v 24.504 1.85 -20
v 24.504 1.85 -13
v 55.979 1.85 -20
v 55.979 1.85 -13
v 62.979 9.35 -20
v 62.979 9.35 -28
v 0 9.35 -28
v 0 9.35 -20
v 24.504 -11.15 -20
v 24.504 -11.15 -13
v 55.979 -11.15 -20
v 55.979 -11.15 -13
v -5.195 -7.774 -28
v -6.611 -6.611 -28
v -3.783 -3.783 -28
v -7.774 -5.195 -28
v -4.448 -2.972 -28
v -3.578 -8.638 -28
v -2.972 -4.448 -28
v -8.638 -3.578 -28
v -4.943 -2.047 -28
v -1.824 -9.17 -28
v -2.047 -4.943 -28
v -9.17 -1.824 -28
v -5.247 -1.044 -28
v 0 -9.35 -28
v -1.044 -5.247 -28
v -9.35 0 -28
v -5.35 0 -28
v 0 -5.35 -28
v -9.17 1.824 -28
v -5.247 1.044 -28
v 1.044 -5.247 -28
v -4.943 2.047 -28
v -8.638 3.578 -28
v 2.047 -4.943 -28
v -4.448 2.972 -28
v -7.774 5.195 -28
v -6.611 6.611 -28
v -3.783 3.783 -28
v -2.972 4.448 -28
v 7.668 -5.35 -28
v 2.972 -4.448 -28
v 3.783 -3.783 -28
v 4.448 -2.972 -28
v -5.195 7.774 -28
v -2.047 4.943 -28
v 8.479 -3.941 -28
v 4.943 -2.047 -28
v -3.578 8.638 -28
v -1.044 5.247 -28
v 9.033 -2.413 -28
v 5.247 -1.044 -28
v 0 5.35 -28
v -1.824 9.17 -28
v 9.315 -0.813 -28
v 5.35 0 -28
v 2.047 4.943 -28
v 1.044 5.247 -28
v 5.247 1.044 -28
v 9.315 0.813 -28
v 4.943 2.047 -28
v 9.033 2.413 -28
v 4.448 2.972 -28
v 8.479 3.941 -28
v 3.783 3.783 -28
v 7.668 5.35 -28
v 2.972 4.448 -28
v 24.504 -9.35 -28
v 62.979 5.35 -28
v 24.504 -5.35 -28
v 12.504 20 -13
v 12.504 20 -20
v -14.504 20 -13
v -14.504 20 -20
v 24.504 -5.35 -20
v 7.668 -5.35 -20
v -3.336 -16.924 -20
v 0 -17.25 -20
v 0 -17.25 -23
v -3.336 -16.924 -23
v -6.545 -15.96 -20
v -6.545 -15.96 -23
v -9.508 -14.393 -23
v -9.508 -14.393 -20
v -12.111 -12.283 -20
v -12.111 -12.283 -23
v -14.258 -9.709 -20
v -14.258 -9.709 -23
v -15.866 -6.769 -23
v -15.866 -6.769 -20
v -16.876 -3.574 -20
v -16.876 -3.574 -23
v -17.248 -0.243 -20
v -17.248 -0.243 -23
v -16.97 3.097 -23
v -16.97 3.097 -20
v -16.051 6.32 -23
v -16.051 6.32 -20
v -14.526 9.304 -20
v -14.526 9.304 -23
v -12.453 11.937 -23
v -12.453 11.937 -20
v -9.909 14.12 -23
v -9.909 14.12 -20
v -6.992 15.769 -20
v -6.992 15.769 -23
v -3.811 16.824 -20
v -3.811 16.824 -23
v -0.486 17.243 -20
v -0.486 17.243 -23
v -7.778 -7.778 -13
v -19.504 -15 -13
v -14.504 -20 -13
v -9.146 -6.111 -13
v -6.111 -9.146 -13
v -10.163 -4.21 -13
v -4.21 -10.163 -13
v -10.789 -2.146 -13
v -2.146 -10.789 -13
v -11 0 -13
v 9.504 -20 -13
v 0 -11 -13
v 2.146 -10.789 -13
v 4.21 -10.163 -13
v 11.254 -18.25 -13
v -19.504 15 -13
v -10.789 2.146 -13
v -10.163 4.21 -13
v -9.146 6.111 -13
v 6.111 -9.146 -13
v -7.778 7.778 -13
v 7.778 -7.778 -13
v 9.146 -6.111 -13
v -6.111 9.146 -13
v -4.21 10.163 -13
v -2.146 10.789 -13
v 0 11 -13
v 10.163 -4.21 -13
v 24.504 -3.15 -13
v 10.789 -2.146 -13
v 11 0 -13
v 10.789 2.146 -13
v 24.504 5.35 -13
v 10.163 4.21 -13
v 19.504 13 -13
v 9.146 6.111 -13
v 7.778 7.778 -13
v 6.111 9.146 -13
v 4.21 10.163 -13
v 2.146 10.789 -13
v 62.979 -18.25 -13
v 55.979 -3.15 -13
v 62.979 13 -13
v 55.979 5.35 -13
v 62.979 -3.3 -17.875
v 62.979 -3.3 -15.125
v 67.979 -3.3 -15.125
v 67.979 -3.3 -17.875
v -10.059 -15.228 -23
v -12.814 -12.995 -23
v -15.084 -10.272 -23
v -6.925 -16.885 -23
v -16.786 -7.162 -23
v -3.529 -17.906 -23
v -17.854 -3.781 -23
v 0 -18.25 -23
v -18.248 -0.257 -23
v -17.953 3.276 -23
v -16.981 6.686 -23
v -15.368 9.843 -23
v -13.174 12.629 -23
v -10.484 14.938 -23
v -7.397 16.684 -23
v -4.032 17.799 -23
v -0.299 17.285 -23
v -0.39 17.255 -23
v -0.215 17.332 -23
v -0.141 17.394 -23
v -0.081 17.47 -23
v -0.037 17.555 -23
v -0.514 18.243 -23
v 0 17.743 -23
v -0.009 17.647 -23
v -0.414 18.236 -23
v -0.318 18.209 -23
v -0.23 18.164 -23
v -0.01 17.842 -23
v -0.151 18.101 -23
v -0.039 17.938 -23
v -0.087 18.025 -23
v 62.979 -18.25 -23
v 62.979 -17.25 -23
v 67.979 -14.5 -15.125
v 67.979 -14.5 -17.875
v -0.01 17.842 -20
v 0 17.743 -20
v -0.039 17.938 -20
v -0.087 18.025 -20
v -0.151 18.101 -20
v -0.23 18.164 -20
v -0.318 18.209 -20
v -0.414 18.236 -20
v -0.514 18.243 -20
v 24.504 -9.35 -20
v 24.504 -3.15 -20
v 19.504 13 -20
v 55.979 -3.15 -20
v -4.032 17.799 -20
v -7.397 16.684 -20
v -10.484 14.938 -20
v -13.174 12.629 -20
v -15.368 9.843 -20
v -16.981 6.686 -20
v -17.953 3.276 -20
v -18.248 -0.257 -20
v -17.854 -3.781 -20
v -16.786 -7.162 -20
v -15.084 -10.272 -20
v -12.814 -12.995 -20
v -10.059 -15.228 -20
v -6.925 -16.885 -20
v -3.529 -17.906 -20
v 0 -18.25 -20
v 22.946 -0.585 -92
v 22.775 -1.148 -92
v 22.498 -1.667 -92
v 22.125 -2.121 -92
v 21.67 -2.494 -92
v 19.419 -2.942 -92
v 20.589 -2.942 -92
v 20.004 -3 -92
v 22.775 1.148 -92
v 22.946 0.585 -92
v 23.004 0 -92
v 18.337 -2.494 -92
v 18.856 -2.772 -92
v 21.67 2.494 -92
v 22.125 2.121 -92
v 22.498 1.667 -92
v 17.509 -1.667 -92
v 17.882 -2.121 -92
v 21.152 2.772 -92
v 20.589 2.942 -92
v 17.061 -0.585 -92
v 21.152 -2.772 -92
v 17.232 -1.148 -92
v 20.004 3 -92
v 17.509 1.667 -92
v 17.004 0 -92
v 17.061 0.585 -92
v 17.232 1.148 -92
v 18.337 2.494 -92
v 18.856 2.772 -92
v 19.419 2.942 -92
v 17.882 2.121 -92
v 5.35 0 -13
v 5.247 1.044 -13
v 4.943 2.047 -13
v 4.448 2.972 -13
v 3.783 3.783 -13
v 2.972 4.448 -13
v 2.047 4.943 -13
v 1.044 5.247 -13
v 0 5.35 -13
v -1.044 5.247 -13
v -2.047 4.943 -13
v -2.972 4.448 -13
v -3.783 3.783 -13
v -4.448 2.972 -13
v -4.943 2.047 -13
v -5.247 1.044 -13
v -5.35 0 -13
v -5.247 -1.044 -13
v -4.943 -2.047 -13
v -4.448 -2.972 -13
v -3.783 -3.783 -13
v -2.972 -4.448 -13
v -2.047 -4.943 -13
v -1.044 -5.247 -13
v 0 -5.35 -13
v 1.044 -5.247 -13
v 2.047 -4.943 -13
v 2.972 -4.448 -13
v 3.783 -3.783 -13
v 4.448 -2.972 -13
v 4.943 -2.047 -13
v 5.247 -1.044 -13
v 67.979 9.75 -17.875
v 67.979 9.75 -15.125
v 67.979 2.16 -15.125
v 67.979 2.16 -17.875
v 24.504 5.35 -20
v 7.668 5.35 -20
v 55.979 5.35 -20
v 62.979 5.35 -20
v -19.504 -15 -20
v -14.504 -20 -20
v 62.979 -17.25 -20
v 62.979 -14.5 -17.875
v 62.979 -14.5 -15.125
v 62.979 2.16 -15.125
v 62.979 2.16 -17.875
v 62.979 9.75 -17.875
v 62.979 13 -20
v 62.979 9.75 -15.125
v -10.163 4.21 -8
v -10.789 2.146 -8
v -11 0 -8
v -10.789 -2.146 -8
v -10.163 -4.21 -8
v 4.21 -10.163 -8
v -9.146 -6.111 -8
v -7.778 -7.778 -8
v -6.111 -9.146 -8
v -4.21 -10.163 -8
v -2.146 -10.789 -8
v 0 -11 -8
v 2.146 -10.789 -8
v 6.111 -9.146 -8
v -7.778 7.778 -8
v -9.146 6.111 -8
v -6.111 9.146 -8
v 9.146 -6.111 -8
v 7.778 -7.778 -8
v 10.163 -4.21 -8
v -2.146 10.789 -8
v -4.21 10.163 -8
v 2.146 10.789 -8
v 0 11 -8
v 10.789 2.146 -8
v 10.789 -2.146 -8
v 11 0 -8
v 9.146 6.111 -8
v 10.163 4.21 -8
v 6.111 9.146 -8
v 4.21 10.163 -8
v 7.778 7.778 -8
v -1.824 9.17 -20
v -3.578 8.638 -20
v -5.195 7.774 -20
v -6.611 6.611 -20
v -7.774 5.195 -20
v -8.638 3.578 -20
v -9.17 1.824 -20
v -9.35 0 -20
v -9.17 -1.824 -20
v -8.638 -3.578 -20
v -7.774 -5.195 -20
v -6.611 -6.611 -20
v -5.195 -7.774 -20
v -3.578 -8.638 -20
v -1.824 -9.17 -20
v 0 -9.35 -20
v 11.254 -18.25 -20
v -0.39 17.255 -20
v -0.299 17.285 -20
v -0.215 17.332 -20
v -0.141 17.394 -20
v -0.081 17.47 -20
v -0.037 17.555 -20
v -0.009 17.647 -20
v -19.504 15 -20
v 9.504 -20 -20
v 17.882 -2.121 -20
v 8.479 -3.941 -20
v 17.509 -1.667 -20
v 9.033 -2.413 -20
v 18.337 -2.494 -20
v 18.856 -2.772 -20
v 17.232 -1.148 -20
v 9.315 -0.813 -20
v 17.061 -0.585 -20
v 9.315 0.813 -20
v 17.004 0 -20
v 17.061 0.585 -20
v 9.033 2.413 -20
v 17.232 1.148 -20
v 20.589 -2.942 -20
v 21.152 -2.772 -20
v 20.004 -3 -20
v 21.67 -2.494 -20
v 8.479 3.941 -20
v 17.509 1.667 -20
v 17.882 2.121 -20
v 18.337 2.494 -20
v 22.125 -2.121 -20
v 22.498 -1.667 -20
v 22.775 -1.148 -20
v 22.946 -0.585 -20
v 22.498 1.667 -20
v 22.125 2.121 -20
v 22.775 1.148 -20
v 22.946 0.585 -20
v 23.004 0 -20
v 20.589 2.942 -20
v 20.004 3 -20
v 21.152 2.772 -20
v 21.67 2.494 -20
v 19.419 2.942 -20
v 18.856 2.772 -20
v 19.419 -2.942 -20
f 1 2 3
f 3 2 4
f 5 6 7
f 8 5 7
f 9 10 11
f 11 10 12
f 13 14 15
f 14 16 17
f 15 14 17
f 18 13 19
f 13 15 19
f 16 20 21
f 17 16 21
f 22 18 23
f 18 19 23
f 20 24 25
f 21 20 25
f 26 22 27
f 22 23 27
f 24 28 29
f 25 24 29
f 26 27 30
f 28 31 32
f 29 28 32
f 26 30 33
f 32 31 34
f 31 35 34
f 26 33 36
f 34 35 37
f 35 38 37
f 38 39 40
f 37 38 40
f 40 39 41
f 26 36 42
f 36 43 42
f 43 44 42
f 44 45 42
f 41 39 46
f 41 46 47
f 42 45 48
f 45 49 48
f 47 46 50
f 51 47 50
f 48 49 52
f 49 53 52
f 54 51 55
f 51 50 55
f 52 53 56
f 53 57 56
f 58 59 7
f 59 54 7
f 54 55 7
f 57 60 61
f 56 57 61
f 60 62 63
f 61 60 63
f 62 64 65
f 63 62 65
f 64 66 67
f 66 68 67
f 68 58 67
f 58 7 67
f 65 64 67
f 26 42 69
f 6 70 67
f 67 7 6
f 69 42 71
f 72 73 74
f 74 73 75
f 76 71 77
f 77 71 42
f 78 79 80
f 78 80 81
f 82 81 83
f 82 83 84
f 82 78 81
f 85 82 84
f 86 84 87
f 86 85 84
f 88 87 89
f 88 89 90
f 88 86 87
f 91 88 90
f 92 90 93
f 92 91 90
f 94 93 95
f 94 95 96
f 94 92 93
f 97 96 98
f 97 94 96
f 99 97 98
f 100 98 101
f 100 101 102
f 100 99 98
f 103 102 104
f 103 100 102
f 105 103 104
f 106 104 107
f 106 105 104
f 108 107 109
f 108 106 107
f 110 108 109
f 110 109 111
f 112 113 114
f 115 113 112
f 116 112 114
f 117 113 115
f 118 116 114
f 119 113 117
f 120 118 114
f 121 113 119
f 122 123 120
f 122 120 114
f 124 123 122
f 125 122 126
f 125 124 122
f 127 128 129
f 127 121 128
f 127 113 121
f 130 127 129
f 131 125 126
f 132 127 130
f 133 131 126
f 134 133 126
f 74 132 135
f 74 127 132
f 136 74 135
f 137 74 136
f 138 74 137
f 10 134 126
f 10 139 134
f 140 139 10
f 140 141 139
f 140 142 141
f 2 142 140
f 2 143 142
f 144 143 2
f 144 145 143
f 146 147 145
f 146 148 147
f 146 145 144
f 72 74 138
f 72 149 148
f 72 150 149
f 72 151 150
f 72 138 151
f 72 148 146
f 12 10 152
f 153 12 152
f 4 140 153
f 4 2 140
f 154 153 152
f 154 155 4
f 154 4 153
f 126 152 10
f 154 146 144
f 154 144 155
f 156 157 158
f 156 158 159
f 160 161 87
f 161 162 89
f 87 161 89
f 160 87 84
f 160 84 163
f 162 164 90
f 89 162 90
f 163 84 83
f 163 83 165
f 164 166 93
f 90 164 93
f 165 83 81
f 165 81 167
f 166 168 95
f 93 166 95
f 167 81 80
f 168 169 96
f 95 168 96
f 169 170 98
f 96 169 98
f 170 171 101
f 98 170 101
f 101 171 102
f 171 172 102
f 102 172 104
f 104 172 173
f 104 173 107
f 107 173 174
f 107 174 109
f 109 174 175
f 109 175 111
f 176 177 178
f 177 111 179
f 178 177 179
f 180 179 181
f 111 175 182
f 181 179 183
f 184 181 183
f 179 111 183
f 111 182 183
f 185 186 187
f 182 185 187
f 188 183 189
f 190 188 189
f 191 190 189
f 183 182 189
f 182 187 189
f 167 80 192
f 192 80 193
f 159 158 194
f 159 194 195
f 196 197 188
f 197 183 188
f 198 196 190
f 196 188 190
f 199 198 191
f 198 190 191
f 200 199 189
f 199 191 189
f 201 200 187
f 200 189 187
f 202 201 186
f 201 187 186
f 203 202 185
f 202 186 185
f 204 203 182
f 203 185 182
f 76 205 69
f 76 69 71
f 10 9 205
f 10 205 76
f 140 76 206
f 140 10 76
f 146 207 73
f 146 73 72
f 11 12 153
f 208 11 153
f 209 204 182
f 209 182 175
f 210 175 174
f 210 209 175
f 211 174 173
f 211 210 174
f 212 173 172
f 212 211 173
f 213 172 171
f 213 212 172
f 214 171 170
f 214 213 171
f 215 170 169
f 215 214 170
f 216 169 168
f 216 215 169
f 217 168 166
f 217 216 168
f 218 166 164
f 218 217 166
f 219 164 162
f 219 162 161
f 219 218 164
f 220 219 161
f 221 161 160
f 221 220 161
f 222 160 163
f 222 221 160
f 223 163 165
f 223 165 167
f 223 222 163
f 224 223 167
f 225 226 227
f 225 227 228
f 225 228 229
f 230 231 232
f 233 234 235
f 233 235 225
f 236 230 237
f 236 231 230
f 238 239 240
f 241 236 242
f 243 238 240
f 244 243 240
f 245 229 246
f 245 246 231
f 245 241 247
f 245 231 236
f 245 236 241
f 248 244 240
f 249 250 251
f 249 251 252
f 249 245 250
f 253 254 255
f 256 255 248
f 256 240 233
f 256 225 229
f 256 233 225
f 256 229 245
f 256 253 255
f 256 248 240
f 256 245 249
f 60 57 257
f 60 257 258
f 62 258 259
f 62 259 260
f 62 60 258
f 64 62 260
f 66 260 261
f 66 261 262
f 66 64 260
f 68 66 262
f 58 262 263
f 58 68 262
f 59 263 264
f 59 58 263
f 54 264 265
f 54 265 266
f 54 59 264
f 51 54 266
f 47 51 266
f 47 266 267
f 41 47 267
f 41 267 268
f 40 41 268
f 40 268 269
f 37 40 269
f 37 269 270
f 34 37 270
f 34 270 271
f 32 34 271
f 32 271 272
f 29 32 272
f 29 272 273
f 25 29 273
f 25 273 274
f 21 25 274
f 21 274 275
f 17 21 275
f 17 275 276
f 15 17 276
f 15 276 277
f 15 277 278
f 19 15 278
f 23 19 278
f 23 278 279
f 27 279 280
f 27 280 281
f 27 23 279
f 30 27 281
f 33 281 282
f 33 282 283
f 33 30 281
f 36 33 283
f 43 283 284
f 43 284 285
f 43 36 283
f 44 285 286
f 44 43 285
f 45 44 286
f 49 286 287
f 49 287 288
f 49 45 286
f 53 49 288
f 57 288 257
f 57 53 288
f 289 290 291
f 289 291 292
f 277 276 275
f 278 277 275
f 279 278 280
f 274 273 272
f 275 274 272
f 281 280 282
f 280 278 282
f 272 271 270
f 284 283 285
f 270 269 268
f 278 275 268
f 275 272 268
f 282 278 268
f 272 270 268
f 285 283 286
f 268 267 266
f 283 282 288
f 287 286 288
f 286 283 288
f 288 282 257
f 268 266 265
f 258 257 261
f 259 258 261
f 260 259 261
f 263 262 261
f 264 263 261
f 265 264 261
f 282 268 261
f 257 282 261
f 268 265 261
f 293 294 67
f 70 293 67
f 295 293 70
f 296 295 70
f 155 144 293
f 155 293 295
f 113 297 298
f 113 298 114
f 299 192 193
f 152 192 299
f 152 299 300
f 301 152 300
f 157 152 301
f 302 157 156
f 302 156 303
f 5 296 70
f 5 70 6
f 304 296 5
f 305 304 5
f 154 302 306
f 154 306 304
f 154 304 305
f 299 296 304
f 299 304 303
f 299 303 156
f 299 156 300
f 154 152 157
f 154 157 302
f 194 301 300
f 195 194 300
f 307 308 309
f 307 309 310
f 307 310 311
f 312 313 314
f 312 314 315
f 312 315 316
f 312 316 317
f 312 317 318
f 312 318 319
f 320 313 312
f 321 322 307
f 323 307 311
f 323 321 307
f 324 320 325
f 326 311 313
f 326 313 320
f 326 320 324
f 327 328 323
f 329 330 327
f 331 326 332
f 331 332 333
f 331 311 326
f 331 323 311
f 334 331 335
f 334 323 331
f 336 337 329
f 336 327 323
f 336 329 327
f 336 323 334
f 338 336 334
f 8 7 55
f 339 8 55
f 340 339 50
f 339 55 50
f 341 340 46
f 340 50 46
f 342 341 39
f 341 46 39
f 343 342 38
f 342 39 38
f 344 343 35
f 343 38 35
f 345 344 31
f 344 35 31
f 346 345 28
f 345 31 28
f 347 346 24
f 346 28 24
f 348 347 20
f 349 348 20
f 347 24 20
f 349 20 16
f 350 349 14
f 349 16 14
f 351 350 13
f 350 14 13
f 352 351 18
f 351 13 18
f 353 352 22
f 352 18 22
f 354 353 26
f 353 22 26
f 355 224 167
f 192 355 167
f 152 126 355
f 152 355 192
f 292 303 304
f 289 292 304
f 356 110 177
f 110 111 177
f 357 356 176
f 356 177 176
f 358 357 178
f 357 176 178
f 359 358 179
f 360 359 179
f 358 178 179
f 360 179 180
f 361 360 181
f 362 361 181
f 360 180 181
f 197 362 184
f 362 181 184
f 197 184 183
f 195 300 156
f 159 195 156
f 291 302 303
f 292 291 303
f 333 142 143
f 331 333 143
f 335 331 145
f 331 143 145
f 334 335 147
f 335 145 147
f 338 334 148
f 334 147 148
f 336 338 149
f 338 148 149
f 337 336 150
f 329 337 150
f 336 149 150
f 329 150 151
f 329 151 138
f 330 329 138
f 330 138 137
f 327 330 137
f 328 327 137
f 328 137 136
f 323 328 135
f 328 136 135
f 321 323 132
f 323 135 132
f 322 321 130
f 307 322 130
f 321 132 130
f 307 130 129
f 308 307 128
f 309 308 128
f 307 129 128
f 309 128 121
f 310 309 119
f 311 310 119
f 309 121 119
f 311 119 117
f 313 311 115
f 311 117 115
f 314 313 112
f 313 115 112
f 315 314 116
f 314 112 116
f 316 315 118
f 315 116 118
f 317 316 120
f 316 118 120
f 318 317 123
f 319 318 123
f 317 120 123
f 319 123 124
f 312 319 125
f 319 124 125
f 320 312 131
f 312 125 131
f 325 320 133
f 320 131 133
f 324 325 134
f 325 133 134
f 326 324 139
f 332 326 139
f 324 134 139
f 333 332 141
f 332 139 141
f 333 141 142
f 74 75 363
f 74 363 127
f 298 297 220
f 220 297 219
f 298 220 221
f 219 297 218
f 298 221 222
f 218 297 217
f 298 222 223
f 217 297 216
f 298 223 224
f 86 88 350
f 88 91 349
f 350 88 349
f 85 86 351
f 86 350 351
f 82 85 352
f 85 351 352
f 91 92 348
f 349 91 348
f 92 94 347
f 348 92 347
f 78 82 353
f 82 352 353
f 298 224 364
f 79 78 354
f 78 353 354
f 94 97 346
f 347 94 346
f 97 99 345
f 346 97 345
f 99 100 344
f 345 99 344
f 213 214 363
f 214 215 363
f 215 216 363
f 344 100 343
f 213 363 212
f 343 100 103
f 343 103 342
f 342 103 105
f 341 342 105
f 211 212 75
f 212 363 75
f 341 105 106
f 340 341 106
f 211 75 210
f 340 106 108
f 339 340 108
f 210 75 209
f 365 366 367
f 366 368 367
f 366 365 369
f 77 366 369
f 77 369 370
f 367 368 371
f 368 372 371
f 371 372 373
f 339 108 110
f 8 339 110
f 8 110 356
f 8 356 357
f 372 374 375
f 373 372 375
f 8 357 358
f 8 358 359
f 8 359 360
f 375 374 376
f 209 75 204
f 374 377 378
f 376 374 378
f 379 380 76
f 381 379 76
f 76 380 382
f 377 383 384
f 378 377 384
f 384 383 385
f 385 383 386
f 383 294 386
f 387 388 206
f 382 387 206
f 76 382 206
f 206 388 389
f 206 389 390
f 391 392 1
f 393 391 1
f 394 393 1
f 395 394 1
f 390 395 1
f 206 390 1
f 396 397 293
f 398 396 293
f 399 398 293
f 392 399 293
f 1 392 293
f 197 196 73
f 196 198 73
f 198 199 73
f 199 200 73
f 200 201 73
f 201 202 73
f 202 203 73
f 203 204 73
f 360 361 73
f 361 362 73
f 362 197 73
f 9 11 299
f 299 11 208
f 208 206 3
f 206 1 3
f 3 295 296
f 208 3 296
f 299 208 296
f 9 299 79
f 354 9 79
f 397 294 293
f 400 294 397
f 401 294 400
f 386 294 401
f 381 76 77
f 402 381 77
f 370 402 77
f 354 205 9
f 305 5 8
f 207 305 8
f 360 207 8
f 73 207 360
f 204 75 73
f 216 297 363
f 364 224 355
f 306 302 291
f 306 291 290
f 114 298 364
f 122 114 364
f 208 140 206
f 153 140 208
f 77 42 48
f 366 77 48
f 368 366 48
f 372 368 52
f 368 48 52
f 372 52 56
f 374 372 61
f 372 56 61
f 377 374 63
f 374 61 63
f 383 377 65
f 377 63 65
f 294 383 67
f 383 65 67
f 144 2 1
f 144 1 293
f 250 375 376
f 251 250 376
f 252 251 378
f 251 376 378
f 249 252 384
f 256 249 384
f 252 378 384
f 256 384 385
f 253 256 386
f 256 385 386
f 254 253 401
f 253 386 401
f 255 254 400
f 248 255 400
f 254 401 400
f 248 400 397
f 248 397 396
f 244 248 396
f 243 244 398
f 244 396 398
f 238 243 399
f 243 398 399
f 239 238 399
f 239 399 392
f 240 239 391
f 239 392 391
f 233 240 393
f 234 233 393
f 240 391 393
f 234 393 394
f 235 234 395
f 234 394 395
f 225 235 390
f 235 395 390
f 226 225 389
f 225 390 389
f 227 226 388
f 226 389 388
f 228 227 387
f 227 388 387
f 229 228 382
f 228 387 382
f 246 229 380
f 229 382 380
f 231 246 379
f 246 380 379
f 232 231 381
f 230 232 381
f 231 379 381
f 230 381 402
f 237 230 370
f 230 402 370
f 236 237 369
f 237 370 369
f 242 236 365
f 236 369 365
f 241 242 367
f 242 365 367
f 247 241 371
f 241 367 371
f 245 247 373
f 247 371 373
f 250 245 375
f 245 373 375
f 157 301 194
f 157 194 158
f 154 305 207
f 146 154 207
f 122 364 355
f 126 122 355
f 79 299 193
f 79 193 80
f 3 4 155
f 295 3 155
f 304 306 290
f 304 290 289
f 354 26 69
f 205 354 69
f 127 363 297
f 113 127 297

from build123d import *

# Parameters (mm, degrees)
SKETCH1_R               = 5.35
BOSS_EXTRUDE2_DEPTH     = 7
BOSS_EXTRUDE3_START     = 8
SKETCH3_R               = 5.35
BOSS_EXTRUDE3_DEPTH     = 8
BOSS_EXTRUDE4_DEPTH     = 3
CHAMFER1_SIZE           = 10
CHAMFER2_SIZE           = 5
CUT_EXTRUDE1_DEPTH      = 67.560662475
CUT_EXTRUDE1_DEPTH_BACK = 67.560662475
SKETCH5_W               = 31.474956737
SKETCH5_H               = 3.5
SKETCH5_H_2             = 8
CHAMFER3_SIZE           = 7
SKETCH6_R               = 11
BOSS_EXTRUDE5_DEPTH     = 5
SKETCH8_W               = 2.75
SKETCH8_H               = 7.59
SKETCH8_H_2             = 11.2
BOSS_EXTRUDE6_DEPTH     = 5
SKETCH9_R               = 3
BOSS_EXTRUDE7_DEPTH     = 72
CUT_EXTRUDE2_REACH      = 127.169
SKETCH10_W              = 8
SKETCH10_H              = 4
FILLET1_R               = 0.5


# Some blends are built 0.0001 mm under size
with BuildPart() as part:
    # Sketch1 → Boss-Extrude2 (new body)
    with BuildSketch(Plane.XY):
        Polygon((-19.503784034, -20), (19.503784034, -20), (19.503784034, -18.25), (62.978740771, -18.25), (62.978740771, 13), (19.503784034, 13), (19.503784034, 20), (-19.503784034, 20), align=None)
        Circle(SKETCH1_R, mode=Mode.SUBTRACT)
    extrude(amount=-BOSS_EXTRUDE2_DEPTH)

    # Sketch3 → Boss-Extrude3 (add)
    with BuildSketch(Plane.XY.offset(BOSS_EXTRUDE3_START)):
        with BuildLine():
            Line((7.668115805, 5.35), (62.978740771, 5.35))
            Line((62.978740771, 5.35), (62.978740771, 9.35))
            Line((62.978740771, 9.35), (0, 9.35))
            ThreePointArc((0, 9.35), (-9.35, 0), (0, -9.35))
            Line((0, -9.35), (62.978740771, -9.35))
            Line((62.978740771, -9.35), (62.978740771, -5.35))
            Line((62.978740771, -5.35), (7.668115805, -5.35))
            ThreePointArc((7.668115805, -5.35), (9.35, 0), (7.668115805, 5.35))
        make_face()
        Circle(SKETCH3_R, mode=Mode.SUBTRACT)
    extrude(amount=-BOSS_EXTRUDE3_DEPTH)

    # Sketch4 → Boss-Extrude4 (add)
    with BuildSketch(Plane.XY):
        with BuildLine():
            Line((0, -18.25), (62.978740771, -18.25))
            Line((62.978740771, -18.25), (62.978740771, -17.25))
            Line((62.978740771, -17.25), (8.306623863, -17.25))
            Line((8.306623863, -17.25), (0, -17.25))
            ThreePointArc((0, -17.25), (-17.25, 0), (0, 17.25))
            Line((0, 17.25), (0, 18.25))
            ThreePointArc((0, 18.25), (-18.25, 0), (0, -18.25))
        make_face()
    extrude(amount=BOSS_EXTRUDE4_DEPTH)

    # Chamfer1
    # the kernel refuses this chamfer: 10 mm, written as the material it takes off along each edge
    with BuildSketch(Plane(origin=(19.503784034, -20, 25.71682988), x_dir=(-0.9996219169112968, -0.027495876610586317, 0), z_dir=(0, 0, -1))) as chamfer1_piece_1_section:
        Polygon((CHAMFER1_SIZE * 0.999621916911, CHAMFER1_SIZE * 0.0274958766106), (-CHAMFER1_SIZE * 0.0274958766106, CHAMFER1_SIZE * 0.999621916911), (0, 0), align=None)
    chamfer1_piece_1 = extrude(amount=58.433659759, mode=Mode.PRIVATE)
    chamfer1_piece_1 = split(chamfer1_piece_1, bisect_by=Plane(origin=(14.814200223, -18.25, -3.5), z_dir=(0, -1, 0)), keep=Keep.TOP, mode=Mode.PRIVATE)
    add(chamfer1_piece_1, mode=Mode.SUBTRACT)

    # Chamfer2
    chamfer2_edges = [part.edges().sort_by_distance(p)[0] for p in [
        (-19.503784034, -20, -3.5),
        (-19.503784034, 20, -3.5),
    ]]
    chamfer(chamfer2_edges, length=CHAMFER2_SIZE)

    # Sketch5 → Cut-Extrude1 (cut, two sides: drawn at the far end of the back side and taken through both)
    with BuildSketch(Plane.XY.offset(-CUT_EXTRUDE1_DEPTH_BACK)):
        with Locations((40.241262403, 3.6)):
            Rectangle(SKETCH5_W, SKETCH5_H)
        with Locations((40.241262403, -7.15)):
            Rectangle(SKETCH5_W, SKETCH5_H_2)
    extrude(amount=CUT_EXTRUDE1_DEPTH + CUT_EXTRUDE1_DEPTH_BACK, mode=Mode.SUBTRACT)

    # Chamfer3
    chamfer3_edges = [part.edges().sort_by_distance(p)[0] for p in [
        (19.503784034, 20, -3.5),
    ]]
    chamfer(chamfer3_edges, length=CHAMFER3_SIZE - 0.0001)  # a hair under: the kernel refuses the full size


with BuildPart() as body_2:
    # Mirror9: mirrored copy
    add(part.part.mirror(Plane.XY.offset(-10)))

    # Sketch6 → Boss-Extrude5 (add)
    with BuildSketch(Plane.XY.offset(-13)):
        Circle(SKETCH6_R)
    extrude(amount=BOSS_EXTRUDE5_DEPTH)

    # Sketch8 → Boss-Extrude6 (add)
    with BuildSketch(Plane(origin=(62.978740771, 0, 0), x_dir=(0, 0, -1), z_dir=(1, 0, 0))):
        with Locations((16.5, 5.955)):
            Rectangle(SKETCH8_W, SKETCH8_H)
        with Locations((16.5, -8.9)):
            Rectangle(SKETCH8_W, SKETCH8_H_2)
    extrude(amount=BOSS_EXTRUDE6_DEPTH)

    # Sketch9 → Boss-Extrude7 (add)
    with BuildSketch(Plane(origin=(0, 0, -20), x_dir=(-1, 0, 0), z_dir=(0, 0, -1))):
        with Locations((-20.003784034, 0)):
            Circle(SKETCH9_R)
    extrude(amount=BOSS_EXTRUDE7_DEPTH)

    # Sketch10 → Cut-Extrude2 (cut, up to next)
    with BuildSketch(Plane(origin=(62.978740771, 0, 0), x_dir=(0, 0, -1), z_dir=(1, 0, 0)), mode=Mode.PRIVATE) as cut_extrude2_sk1:
        with Locations((24, -7.35)):
            Rectangle(SKETCH10_W, SKETCH10_H)
    cut_extrude2_tool1 = extrude(cut_extrude2_sk1.sketch, amount=-CUT_EXTRUDE2_REACH, mode=Mode.PRIVATE) & body_2.part
    add(cut_extrude2_tool1.solids().sort_by_distance((62.978741, -7.35, -24))[0], mode=Mode.SUBTRACT)

    # Fillet1
    fillet1_edges = [body_2.edges().sort_by_distance(p)[0] for p in [
        (0, 18.25, -21.5),
        (0, 17.25, -21.5),
    ]]
    fillet(fillet1_edges, radius=FILLET1_R - 0.0001)  # a hair under: the kernel refuses the full size


solid = body_2.part
